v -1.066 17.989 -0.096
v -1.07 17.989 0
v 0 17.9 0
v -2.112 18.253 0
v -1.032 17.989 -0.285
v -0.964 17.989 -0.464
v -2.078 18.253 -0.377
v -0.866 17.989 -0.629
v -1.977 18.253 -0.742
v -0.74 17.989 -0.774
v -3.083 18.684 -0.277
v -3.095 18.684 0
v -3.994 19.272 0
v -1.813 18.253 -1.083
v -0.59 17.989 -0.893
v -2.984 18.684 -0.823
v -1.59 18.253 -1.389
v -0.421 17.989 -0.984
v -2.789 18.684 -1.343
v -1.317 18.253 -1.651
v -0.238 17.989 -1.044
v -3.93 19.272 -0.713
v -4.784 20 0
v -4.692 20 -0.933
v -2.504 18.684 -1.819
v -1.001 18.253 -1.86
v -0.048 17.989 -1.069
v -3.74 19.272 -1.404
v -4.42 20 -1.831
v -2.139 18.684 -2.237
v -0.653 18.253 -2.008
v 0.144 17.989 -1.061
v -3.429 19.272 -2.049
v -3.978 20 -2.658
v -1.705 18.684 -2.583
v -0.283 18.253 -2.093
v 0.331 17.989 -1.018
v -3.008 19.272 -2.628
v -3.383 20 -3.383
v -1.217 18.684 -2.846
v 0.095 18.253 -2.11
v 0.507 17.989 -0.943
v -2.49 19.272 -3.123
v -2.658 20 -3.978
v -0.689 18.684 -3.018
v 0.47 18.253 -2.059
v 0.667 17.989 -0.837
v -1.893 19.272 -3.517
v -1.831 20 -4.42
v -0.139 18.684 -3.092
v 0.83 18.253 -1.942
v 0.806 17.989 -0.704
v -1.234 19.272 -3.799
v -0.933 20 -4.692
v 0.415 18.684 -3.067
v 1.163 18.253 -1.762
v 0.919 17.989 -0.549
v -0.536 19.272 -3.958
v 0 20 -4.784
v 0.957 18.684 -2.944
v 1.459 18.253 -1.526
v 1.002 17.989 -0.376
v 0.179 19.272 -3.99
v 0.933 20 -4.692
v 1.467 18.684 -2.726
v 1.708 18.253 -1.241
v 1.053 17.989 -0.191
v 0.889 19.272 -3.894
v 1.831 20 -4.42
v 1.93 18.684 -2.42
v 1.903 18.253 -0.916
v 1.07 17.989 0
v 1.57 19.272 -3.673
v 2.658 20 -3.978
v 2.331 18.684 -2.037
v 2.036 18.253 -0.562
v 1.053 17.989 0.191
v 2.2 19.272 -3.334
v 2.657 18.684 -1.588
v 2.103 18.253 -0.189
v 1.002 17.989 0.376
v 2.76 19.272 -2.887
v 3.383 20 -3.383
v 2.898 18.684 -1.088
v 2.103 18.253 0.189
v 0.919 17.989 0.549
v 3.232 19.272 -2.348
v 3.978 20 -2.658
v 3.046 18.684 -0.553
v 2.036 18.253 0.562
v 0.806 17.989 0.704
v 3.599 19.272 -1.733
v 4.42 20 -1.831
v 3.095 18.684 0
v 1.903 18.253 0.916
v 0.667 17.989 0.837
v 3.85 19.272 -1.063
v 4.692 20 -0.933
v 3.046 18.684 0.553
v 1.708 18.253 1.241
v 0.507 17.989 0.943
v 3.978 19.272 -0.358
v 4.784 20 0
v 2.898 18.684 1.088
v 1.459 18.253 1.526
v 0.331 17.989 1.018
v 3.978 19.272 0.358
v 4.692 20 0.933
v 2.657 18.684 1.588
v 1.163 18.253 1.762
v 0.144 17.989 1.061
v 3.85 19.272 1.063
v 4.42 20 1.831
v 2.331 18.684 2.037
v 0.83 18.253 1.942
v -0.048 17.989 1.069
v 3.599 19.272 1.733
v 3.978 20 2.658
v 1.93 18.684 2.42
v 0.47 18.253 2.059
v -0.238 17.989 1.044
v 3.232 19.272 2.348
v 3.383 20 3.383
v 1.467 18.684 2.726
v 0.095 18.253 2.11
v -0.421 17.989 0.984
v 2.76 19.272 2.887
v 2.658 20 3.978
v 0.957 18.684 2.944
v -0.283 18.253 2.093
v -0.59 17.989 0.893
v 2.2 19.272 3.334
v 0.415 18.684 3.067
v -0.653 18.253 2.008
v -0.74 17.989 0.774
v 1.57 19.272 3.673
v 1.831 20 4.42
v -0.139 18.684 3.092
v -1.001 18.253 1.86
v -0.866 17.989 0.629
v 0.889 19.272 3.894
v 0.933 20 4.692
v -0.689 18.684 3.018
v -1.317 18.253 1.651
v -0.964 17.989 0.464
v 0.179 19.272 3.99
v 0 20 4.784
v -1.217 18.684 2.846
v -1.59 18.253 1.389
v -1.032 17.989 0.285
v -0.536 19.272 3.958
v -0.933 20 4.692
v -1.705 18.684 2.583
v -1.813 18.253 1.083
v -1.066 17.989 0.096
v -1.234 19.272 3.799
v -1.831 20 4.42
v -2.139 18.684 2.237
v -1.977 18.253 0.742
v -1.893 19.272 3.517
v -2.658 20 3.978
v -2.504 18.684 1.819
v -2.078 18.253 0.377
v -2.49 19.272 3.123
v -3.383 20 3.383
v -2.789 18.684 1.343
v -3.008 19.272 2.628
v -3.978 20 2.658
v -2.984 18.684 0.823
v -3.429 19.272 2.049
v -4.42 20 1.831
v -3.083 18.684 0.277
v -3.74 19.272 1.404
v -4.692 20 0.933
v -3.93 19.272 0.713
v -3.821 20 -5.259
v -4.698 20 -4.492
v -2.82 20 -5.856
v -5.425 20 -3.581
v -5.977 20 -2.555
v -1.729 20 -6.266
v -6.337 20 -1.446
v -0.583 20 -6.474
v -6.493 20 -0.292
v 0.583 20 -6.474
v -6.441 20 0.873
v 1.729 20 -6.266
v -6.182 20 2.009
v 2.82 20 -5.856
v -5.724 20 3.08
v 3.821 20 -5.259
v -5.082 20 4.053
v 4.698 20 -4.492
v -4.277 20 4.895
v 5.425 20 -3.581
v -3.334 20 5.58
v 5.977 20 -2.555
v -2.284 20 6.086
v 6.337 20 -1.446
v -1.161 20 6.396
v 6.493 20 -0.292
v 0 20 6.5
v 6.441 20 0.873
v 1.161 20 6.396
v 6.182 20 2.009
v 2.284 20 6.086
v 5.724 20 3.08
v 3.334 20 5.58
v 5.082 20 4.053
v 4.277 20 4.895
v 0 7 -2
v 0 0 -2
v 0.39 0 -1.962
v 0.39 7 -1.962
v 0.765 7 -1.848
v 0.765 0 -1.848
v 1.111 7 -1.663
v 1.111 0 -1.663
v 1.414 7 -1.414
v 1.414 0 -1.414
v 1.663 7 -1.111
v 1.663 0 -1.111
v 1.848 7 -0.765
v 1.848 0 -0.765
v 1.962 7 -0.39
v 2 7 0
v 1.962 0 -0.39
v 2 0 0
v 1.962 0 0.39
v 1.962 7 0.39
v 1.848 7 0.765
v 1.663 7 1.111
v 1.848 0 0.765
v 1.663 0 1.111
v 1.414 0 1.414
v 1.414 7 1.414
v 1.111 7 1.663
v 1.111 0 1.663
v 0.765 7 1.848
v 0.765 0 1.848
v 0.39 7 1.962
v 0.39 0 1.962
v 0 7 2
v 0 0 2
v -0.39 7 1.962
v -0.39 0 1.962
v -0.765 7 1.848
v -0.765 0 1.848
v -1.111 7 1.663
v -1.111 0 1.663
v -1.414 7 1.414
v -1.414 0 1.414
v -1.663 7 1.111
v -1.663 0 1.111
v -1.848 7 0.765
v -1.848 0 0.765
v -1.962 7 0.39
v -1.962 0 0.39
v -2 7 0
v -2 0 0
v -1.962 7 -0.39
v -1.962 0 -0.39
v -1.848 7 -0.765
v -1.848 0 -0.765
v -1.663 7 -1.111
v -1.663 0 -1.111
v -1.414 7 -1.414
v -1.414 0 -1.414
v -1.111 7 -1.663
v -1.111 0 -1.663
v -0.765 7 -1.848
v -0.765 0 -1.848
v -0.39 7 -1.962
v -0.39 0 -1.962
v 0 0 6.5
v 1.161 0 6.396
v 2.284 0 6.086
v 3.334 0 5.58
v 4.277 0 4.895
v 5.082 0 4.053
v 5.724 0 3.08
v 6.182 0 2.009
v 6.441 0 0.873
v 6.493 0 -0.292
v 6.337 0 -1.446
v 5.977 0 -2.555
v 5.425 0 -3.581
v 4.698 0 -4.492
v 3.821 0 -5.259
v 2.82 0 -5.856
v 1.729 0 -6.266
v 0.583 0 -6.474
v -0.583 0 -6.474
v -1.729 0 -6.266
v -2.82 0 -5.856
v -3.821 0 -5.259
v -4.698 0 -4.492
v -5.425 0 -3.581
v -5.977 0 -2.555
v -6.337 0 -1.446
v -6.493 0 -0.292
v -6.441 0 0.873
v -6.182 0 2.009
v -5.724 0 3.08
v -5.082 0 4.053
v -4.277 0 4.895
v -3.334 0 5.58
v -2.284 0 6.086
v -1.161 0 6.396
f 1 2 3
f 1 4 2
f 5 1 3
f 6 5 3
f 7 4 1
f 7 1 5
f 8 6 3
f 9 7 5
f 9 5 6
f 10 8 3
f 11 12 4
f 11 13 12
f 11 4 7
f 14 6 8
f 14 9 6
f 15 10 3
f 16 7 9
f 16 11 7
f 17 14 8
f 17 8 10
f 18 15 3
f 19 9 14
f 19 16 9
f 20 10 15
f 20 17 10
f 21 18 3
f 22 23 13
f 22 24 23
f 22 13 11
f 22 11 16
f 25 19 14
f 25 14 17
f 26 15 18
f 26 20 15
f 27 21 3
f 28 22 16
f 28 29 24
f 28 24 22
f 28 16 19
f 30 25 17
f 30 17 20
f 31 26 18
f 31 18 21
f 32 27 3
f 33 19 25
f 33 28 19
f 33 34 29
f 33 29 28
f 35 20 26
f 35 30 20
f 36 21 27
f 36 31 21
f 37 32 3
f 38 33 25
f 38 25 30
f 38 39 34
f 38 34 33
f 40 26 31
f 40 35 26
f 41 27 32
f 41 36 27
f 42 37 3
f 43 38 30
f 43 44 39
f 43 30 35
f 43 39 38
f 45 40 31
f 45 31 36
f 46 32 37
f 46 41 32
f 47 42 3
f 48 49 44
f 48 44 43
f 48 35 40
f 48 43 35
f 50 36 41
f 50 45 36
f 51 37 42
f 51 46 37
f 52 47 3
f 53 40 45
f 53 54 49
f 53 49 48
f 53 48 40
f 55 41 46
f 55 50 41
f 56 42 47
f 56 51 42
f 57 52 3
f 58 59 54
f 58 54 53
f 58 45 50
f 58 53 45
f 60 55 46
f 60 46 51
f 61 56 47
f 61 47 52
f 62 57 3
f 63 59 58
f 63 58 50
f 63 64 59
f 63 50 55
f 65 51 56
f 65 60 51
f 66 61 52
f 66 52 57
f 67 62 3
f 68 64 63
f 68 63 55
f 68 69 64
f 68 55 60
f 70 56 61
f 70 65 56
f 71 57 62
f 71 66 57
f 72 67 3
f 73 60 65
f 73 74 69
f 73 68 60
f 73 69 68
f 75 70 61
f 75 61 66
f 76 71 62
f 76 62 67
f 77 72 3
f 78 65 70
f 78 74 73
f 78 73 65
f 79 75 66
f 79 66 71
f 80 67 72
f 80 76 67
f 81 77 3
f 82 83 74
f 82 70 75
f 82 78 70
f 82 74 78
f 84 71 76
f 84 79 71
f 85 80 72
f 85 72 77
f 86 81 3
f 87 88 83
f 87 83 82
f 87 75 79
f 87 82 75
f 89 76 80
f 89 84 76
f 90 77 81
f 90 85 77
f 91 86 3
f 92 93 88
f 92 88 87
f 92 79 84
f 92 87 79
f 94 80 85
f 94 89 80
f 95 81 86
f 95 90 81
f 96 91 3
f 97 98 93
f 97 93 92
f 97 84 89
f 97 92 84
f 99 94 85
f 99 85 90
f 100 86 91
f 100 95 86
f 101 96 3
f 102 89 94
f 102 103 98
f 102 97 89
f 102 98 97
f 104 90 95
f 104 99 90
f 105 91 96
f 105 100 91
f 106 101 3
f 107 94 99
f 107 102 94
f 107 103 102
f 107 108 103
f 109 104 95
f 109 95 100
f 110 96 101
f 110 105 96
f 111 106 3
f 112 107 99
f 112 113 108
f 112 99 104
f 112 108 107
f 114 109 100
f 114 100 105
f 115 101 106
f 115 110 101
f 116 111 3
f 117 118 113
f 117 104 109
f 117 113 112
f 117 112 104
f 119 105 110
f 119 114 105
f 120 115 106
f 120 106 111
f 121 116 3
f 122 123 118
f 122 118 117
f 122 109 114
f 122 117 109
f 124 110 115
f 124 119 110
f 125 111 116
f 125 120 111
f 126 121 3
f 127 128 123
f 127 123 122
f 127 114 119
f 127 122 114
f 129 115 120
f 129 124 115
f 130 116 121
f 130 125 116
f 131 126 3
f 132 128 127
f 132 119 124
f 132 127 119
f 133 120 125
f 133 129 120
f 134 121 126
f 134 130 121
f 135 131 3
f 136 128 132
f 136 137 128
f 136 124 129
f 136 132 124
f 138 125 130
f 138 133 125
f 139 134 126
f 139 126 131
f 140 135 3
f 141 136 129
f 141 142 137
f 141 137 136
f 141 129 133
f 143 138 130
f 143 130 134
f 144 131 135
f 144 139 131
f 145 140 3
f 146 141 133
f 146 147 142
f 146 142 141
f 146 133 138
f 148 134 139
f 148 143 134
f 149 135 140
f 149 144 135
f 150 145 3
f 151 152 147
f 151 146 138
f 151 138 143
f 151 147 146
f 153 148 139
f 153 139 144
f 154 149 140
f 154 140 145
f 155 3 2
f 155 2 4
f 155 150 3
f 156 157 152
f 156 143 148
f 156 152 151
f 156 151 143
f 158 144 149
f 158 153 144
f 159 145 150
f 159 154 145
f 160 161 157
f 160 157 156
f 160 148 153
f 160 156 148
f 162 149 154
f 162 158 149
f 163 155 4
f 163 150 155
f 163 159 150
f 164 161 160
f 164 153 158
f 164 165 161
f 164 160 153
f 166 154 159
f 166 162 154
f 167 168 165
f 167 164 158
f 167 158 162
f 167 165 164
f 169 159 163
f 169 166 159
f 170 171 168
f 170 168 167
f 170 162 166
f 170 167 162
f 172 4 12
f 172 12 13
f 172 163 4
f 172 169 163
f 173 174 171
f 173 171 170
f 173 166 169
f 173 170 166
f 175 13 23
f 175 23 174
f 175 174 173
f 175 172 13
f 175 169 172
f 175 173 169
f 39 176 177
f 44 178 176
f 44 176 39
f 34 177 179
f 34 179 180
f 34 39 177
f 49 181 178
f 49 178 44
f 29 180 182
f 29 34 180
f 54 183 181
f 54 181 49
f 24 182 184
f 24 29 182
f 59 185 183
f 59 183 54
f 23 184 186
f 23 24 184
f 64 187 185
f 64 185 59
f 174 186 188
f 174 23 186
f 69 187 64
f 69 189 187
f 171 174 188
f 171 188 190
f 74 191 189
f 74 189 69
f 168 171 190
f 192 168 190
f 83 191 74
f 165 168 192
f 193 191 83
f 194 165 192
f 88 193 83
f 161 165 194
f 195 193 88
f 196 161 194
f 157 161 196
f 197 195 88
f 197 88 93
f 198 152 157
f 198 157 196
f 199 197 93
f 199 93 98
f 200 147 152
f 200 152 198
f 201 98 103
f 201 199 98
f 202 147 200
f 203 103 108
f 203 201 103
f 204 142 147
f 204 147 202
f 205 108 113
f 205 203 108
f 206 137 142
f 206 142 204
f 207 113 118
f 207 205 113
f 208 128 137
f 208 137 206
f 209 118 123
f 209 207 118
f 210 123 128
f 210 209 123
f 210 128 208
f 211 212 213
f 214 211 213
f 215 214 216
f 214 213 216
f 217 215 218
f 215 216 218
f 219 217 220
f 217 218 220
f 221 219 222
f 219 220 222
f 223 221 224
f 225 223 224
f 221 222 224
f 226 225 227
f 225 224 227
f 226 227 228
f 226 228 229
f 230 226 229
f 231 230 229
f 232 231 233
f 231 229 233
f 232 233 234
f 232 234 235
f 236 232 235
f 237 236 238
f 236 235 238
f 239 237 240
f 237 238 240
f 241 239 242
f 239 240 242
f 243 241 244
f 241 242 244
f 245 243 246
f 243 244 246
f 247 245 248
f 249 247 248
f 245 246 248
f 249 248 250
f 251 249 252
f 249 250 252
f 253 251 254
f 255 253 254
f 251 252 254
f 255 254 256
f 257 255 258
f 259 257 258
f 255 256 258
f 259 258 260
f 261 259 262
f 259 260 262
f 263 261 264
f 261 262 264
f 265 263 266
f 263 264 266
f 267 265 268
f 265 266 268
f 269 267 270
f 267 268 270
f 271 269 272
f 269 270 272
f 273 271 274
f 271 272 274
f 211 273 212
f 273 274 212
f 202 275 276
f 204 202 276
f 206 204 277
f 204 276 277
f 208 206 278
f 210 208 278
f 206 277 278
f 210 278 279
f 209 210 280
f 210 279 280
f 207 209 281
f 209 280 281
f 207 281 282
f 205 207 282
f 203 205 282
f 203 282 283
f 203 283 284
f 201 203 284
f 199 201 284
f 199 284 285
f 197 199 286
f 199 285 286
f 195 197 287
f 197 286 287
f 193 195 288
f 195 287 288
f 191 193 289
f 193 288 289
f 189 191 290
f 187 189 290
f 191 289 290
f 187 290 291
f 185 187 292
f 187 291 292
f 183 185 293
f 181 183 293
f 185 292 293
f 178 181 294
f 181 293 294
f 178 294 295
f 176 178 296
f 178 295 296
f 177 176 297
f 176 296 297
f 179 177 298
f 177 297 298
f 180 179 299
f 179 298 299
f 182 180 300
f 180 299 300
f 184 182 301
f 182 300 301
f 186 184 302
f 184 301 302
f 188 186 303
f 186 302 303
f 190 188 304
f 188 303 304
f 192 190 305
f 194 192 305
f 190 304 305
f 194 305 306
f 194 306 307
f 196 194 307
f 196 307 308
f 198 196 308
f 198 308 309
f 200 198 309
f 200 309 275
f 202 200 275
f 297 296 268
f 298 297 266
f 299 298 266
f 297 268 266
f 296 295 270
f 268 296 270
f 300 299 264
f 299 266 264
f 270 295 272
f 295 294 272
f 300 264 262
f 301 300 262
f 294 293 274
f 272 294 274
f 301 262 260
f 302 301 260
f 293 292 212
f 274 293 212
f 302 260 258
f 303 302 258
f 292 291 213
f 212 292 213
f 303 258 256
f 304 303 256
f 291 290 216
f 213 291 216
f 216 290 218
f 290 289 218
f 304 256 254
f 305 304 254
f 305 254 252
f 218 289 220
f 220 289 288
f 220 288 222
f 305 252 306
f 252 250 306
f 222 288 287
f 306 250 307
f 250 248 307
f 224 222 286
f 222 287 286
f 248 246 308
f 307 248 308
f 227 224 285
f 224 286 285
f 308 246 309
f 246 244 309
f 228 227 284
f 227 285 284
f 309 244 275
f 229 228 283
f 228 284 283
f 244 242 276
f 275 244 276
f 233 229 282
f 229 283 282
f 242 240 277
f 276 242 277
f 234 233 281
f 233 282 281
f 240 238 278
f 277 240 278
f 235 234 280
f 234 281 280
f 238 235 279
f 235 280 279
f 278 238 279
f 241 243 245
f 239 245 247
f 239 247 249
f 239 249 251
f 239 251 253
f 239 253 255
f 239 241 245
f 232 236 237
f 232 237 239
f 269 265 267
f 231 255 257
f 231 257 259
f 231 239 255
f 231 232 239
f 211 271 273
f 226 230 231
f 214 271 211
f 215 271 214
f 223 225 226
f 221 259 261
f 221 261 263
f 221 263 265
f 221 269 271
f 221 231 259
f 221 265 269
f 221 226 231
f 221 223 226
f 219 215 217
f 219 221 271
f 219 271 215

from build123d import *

# Parameters (mm, degrees)
SKETCH1_R           = 6.5
BOSS_EXTRUDE1_DEPTH = 20
SKETCH2_R           = 2
CUT_EXTRUDE1_DEPTH  = 7


with BuildPart() as part:
    # Sketch1 → Boss-Extrude1 (new body)
    with BuildSketch(Plane(origin=(0, 0, 0), x_dir=(1, 0, 0), z_dir=(0, 1, 0))):
        with Locations(Location((0, 0, 0), (0, 0, 270))):
            Circle(SKETCH1_R)
    extrude(amount=BOSS_EXTRUDE1_DEPTH)

    # Sketch2 → Cut-Extrude1 (cut)
    with BuildSketch(Plane.XZ):
        with Locations(Location((0, 0, 0), (0, 0, 270))):
            Circle(SKETCH2_R)
    extrude(amount=-CUT_EXTRUDE1_DEPTH, mode=Mode.SUBTRACT)

    # Sketch3 → Cut-Revolve1 (revolve, cut)
    with BuildSketch(Plane.XY):
        with BuildLine():
            Line((0, 30.9), (0, 17.9))
            ThreePointArc((0, 17.9), (-6.5, 24.4), (0, 30.9))
        make_face()
    revolve(axis=Axis((0, 20, 0), (0, -1, 0)), mode=Mode.SUBTRACT)


solid = part.part
